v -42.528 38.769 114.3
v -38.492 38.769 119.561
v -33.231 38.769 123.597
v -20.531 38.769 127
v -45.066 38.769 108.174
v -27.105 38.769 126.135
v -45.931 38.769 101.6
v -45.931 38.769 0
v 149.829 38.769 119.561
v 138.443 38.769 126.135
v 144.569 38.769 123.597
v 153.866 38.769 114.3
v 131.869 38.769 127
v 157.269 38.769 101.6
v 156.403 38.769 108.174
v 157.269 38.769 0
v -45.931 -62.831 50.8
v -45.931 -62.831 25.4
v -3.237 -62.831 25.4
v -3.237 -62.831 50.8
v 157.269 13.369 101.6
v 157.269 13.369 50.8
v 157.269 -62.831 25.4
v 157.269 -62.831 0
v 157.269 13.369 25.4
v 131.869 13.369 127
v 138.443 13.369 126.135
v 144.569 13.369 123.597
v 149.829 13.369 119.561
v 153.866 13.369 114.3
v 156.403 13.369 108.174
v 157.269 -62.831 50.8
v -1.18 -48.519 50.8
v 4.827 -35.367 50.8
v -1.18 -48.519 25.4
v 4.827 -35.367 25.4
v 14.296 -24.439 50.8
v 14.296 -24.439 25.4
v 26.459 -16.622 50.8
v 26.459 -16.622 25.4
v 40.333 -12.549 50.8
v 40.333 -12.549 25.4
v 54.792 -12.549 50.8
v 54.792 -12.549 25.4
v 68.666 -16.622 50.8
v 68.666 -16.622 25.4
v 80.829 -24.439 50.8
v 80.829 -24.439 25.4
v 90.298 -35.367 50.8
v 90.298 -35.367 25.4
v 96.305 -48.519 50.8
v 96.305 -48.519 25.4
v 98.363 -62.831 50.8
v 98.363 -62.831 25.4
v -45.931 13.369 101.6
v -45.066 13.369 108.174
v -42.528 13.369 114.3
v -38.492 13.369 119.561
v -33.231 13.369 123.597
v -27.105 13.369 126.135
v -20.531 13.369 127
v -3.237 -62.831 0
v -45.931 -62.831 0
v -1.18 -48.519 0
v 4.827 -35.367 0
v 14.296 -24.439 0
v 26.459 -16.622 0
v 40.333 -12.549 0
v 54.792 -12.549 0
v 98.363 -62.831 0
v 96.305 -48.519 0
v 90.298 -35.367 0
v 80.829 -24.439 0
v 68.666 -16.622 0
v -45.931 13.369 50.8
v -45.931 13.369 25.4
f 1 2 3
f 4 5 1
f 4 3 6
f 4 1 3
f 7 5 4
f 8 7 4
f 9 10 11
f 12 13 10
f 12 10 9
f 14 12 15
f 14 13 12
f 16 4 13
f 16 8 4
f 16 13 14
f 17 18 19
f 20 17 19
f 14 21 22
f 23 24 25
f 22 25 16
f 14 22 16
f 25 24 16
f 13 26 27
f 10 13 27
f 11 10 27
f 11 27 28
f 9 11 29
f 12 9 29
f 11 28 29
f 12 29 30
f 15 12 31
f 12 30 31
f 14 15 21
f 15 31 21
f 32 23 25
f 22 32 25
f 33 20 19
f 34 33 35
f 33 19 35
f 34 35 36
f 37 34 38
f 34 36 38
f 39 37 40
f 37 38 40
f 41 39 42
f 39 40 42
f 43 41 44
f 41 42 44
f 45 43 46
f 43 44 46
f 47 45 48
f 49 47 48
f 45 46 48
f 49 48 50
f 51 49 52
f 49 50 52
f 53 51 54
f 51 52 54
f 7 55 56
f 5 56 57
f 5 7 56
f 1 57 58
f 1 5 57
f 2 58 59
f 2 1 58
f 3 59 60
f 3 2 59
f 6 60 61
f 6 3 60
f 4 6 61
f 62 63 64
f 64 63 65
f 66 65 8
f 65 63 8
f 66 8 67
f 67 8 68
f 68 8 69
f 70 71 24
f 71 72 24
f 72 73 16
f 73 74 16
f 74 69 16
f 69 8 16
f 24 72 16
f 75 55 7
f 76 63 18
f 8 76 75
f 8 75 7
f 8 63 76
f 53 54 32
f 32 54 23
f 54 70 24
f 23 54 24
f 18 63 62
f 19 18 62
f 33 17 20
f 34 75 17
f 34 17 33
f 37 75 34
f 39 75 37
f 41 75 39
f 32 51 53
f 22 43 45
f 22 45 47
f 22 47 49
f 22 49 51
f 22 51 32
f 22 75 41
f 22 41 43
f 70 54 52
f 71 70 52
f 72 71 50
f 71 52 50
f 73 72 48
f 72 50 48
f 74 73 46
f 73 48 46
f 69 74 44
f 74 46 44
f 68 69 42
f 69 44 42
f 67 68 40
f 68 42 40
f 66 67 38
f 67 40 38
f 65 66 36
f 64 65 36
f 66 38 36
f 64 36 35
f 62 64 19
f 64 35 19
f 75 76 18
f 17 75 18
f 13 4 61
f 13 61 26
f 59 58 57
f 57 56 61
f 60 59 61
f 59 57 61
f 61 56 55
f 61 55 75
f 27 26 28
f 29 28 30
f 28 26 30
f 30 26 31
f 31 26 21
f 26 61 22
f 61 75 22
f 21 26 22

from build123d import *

# Parameters (mm, degrees)
F8_W     = 203.2
F8_H     = 101.6
F0_DEPTH = 25.4
F1_W     = 203.2
F1_H     = 25.4
F2_DEPTH = 101.6
F9_DEPTH = 25.4
F4_R     = 25.4
F5_R     = 50.8
F6_DEPTH = 25.4
F7_DEPTH = 25.4


with BuildPart() as f0:
    # F8 (on Top) → F0 (new body)
    with BuildSketch(Plane.XY):
        with Locations((55.668721, -12.031432)):
            Rectangle(F8_W, F8_H)
    extrude(amount=F0_DEPTH)

    # F1 (on face) → F2 (join)
    with BuildSketch(Plane.XY.offset(25.4)):
        with Locations((55.668721, 26.068568)):
            Rectangle(F1_W, F1_H)
    extrude(amount=F2_DEPTH)

    # F3 (on face) → F9 (cut)
    with BuildSketch(Plane.XZ.offset(-13.368568)):
        with BuildLine():
            Line((157.268721, 101.6), (157.268721, 127))
            Line((157.268721, 127), (131.868721, 127))
            ThreePointArc((131.868721, 127), (149.829233, 119.560512), (157.268721, 101.6))
        make_face()
    extrude(amount=-F9_DEPTH, mode=Mode.SUBTRACT)

    # F4
    f4_edges = [f0.edges().sort_by_distance(p)[0] for p in [
        (-45.931279, 26.068568, 127),
    ]]
    fillet(f4_edges, radius=F4_R)

    # F5 (on face) → F6 (cut)
    with BuildSketch(Plane.XY.offset(25.4)):
        with Locations((47.562543, -62.831432)):
            Circle(F5_R)
    extrude(amount=-F6_DEPTH, mode=Mode.SUBTRACT)

    # F0_face (on face) → F7 (join)
    with BuildSketch(Plane(origin=(55.668721, -12.031432, 25.4), x_dir=(1, 0, 0), z_dir=(0, 0, 1))):
        with BuildLine():
            Line((42.693822, -50.8), (101.6, -50.8))
            Line((101.6, -50.8), (101.6, 25.4))
            Line((101.6, 25.4), (-101.6, 25.4))
            Line((-101.6, 25.4), (-101.6, -50.8))
            Line((-101.6, -50.8), (-58.906178, -50.8))
            ThreePointArc((-58.906178, -50.8), (-8.106178, 0), (42.693822, -50.8))
        make_face()
    extrude(amount=F7_DEPTH)


solid = f0.part
